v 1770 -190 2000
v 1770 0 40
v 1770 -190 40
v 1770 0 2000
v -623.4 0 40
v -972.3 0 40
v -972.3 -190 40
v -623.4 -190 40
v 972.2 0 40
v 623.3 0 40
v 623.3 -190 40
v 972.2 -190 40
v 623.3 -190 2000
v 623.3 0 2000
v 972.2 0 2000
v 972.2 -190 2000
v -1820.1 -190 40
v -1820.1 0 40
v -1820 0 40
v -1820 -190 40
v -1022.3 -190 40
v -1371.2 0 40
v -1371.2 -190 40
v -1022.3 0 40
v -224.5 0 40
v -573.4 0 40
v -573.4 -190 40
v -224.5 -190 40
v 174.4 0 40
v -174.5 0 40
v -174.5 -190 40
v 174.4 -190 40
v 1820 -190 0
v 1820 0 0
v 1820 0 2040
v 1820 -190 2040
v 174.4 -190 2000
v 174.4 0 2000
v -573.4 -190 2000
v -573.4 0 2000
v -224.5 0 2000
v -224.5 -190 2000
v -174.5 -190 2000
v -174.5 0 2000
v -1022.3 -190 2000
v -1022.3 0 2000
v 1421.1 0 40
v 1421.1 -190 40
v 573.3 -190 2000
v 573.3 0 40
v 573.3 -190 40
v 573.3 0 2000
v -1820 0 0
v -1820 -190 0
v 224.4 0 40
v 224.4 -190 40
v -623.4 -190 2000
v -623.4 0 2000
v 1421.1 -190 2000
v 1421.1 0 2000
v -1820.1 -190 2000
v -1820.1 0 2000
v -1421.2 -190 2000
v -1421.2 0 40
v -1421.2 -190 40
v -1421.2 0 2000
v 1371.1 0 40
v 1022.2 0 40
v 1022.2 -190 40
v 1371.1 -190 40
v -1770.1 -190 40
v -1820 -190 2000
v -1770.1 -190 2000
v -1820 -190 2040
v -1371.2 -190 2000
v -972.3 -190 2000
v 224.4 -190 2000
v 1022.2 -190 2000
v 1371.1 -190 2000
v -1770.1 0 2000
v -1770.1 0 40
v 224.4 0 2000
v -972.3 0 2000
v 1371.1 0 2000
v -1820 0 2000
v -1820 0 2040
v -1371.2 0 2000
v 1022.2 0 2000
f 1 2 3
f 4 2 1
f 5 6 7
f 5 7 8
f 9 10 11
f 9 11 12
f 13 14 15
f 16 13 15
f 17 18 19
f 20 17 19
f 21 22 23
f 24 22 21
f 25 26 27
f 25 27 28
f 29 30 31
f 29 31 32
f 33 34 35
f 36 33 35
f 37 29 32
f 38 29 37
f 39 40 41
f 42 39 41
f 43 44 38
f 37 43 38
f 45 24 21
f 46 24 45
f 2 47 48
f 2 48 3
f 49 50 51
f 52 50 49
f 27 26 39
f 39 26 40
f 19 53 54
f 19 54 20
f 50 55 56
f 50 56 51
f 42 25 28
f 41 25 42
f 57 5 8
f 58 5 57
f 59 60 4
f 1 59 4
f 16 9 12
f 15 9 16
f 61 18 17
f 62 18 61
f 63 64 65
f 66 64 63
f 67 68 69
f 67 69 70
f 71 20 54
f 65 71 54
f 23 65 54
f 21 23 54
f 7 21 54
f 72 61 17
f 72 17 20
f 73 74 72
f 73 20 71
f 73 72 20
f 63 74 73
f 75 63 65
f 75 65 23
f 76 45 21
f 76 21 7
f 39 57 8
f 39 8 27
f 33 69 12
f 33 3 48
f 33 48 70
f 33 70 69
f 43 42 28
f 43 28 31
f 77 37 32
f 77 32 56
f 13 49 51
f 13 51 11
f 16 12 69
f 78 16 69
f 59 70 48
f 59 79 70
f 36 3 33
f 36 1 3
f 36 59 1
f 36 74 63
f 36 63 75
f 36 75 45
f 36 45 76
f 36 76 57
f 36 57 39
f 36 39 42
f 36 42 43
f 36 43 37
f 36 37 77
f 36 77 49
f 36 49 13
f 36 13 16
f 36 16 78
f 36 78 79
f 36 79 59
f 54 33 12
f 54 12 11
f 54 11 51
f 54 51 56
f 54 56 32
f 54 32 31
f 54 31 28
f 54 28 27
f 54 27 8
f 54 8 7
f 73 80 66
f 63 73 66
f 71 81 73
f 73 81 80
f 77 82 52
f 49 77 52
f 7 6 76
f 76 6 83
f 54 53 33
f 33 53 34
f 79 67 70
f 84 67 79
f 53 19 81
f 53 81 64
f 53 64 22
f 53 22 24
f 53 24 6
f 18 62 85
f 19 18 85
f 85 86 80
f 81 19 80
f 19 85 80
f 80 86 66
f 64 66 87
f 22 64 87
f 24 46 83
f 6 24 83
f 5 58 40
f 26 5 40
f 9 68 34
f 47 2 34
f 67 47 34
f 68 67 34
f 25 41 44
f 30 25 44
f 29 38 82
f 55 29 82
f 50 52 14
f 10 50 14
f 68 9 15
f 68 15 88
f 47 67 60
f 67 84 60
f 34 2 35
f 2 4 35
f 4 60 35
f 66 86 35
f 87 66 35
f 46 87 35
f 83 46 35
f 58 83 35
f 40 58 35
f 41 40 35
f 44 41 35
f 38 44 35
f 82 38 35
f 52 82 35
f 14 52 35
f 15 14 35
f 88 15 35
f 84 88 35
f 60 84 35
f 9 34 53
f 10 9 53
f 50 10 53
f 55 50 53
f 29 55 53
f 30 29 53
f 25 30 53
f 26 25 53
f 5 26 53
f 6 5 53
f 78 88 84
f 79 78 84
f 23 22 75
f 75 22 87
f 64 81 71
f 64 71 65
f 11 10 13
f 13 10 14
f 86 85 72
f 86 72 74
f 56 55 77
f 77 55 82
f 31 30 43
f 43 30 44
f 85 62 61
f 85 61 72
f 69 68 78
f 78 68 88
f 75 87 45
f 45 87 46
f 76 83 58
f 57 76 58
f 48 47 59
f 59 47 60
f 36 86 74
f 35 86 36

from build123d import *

# Parameters (mm, degrees)
F0_W     = 3640
F0_H     = 40
F1_DEPTH = 190
F2_DEPTH = 190
F3_W     = 50
F3_H     = 1960
F4_DEPTH = 190


with BuildPart() as f1:
    # F0 (on Front) → F1 (new body)
    with BuildSketch(Plane.XZ):
        with Locations((0, 20)):
            Rectangle(F0_W, F0_H)
    extrude(amount=F1_DEPTH)



with BuildPart() as f2:
    # F0 (on Front) → F2 (new body)
    with BuildSketch(Plane.XZ):
        with Locations((0, 2020)):
            Rectangle(F0_W, F0_H)
    extrude(amount=F2_DEPTH)


with BuildPart() as f1_1:
    add(f1.part)

    add(f2.part)  # F4 merges F2
    # F3 (on Front) → F4 (join)
    with BuildSketch(Plane.XZ):
        with Locations((1795, 1020)):
            Rectangle(F3_W, F3_H)
        with Locations((1396.1, 1020)):
            Rectangle(F3_W, F3_H)
        with Locations((997.2, 1020)):
            Rectangle(F3_W, F3_H)
        with Locations((598.3, 1020)):
            Rectangle(F3_W, F3_H)
        with Locations((199.4, 1020)):
            Rectangle(F3_W, F3_H)
        with Locations((-199.5, 1020)):
            Rectangle(F3_W, F3_H)
        with Locations((-598.4, 1020)):
            Rectangle(F3_W, F3_H)
        with Locations((-997.3, 1020)):
            Rectangle(F3_W, F3_H)
        with Locations((-1396.2, 1020)):
            Rectangle(F3_W, F3_H)
        with Locations((-1795.1, 1020)):
            Rectangle(F3_W, F3_H)
    extrude(amount=F4_DEPTH)


solid = f1_1.part
